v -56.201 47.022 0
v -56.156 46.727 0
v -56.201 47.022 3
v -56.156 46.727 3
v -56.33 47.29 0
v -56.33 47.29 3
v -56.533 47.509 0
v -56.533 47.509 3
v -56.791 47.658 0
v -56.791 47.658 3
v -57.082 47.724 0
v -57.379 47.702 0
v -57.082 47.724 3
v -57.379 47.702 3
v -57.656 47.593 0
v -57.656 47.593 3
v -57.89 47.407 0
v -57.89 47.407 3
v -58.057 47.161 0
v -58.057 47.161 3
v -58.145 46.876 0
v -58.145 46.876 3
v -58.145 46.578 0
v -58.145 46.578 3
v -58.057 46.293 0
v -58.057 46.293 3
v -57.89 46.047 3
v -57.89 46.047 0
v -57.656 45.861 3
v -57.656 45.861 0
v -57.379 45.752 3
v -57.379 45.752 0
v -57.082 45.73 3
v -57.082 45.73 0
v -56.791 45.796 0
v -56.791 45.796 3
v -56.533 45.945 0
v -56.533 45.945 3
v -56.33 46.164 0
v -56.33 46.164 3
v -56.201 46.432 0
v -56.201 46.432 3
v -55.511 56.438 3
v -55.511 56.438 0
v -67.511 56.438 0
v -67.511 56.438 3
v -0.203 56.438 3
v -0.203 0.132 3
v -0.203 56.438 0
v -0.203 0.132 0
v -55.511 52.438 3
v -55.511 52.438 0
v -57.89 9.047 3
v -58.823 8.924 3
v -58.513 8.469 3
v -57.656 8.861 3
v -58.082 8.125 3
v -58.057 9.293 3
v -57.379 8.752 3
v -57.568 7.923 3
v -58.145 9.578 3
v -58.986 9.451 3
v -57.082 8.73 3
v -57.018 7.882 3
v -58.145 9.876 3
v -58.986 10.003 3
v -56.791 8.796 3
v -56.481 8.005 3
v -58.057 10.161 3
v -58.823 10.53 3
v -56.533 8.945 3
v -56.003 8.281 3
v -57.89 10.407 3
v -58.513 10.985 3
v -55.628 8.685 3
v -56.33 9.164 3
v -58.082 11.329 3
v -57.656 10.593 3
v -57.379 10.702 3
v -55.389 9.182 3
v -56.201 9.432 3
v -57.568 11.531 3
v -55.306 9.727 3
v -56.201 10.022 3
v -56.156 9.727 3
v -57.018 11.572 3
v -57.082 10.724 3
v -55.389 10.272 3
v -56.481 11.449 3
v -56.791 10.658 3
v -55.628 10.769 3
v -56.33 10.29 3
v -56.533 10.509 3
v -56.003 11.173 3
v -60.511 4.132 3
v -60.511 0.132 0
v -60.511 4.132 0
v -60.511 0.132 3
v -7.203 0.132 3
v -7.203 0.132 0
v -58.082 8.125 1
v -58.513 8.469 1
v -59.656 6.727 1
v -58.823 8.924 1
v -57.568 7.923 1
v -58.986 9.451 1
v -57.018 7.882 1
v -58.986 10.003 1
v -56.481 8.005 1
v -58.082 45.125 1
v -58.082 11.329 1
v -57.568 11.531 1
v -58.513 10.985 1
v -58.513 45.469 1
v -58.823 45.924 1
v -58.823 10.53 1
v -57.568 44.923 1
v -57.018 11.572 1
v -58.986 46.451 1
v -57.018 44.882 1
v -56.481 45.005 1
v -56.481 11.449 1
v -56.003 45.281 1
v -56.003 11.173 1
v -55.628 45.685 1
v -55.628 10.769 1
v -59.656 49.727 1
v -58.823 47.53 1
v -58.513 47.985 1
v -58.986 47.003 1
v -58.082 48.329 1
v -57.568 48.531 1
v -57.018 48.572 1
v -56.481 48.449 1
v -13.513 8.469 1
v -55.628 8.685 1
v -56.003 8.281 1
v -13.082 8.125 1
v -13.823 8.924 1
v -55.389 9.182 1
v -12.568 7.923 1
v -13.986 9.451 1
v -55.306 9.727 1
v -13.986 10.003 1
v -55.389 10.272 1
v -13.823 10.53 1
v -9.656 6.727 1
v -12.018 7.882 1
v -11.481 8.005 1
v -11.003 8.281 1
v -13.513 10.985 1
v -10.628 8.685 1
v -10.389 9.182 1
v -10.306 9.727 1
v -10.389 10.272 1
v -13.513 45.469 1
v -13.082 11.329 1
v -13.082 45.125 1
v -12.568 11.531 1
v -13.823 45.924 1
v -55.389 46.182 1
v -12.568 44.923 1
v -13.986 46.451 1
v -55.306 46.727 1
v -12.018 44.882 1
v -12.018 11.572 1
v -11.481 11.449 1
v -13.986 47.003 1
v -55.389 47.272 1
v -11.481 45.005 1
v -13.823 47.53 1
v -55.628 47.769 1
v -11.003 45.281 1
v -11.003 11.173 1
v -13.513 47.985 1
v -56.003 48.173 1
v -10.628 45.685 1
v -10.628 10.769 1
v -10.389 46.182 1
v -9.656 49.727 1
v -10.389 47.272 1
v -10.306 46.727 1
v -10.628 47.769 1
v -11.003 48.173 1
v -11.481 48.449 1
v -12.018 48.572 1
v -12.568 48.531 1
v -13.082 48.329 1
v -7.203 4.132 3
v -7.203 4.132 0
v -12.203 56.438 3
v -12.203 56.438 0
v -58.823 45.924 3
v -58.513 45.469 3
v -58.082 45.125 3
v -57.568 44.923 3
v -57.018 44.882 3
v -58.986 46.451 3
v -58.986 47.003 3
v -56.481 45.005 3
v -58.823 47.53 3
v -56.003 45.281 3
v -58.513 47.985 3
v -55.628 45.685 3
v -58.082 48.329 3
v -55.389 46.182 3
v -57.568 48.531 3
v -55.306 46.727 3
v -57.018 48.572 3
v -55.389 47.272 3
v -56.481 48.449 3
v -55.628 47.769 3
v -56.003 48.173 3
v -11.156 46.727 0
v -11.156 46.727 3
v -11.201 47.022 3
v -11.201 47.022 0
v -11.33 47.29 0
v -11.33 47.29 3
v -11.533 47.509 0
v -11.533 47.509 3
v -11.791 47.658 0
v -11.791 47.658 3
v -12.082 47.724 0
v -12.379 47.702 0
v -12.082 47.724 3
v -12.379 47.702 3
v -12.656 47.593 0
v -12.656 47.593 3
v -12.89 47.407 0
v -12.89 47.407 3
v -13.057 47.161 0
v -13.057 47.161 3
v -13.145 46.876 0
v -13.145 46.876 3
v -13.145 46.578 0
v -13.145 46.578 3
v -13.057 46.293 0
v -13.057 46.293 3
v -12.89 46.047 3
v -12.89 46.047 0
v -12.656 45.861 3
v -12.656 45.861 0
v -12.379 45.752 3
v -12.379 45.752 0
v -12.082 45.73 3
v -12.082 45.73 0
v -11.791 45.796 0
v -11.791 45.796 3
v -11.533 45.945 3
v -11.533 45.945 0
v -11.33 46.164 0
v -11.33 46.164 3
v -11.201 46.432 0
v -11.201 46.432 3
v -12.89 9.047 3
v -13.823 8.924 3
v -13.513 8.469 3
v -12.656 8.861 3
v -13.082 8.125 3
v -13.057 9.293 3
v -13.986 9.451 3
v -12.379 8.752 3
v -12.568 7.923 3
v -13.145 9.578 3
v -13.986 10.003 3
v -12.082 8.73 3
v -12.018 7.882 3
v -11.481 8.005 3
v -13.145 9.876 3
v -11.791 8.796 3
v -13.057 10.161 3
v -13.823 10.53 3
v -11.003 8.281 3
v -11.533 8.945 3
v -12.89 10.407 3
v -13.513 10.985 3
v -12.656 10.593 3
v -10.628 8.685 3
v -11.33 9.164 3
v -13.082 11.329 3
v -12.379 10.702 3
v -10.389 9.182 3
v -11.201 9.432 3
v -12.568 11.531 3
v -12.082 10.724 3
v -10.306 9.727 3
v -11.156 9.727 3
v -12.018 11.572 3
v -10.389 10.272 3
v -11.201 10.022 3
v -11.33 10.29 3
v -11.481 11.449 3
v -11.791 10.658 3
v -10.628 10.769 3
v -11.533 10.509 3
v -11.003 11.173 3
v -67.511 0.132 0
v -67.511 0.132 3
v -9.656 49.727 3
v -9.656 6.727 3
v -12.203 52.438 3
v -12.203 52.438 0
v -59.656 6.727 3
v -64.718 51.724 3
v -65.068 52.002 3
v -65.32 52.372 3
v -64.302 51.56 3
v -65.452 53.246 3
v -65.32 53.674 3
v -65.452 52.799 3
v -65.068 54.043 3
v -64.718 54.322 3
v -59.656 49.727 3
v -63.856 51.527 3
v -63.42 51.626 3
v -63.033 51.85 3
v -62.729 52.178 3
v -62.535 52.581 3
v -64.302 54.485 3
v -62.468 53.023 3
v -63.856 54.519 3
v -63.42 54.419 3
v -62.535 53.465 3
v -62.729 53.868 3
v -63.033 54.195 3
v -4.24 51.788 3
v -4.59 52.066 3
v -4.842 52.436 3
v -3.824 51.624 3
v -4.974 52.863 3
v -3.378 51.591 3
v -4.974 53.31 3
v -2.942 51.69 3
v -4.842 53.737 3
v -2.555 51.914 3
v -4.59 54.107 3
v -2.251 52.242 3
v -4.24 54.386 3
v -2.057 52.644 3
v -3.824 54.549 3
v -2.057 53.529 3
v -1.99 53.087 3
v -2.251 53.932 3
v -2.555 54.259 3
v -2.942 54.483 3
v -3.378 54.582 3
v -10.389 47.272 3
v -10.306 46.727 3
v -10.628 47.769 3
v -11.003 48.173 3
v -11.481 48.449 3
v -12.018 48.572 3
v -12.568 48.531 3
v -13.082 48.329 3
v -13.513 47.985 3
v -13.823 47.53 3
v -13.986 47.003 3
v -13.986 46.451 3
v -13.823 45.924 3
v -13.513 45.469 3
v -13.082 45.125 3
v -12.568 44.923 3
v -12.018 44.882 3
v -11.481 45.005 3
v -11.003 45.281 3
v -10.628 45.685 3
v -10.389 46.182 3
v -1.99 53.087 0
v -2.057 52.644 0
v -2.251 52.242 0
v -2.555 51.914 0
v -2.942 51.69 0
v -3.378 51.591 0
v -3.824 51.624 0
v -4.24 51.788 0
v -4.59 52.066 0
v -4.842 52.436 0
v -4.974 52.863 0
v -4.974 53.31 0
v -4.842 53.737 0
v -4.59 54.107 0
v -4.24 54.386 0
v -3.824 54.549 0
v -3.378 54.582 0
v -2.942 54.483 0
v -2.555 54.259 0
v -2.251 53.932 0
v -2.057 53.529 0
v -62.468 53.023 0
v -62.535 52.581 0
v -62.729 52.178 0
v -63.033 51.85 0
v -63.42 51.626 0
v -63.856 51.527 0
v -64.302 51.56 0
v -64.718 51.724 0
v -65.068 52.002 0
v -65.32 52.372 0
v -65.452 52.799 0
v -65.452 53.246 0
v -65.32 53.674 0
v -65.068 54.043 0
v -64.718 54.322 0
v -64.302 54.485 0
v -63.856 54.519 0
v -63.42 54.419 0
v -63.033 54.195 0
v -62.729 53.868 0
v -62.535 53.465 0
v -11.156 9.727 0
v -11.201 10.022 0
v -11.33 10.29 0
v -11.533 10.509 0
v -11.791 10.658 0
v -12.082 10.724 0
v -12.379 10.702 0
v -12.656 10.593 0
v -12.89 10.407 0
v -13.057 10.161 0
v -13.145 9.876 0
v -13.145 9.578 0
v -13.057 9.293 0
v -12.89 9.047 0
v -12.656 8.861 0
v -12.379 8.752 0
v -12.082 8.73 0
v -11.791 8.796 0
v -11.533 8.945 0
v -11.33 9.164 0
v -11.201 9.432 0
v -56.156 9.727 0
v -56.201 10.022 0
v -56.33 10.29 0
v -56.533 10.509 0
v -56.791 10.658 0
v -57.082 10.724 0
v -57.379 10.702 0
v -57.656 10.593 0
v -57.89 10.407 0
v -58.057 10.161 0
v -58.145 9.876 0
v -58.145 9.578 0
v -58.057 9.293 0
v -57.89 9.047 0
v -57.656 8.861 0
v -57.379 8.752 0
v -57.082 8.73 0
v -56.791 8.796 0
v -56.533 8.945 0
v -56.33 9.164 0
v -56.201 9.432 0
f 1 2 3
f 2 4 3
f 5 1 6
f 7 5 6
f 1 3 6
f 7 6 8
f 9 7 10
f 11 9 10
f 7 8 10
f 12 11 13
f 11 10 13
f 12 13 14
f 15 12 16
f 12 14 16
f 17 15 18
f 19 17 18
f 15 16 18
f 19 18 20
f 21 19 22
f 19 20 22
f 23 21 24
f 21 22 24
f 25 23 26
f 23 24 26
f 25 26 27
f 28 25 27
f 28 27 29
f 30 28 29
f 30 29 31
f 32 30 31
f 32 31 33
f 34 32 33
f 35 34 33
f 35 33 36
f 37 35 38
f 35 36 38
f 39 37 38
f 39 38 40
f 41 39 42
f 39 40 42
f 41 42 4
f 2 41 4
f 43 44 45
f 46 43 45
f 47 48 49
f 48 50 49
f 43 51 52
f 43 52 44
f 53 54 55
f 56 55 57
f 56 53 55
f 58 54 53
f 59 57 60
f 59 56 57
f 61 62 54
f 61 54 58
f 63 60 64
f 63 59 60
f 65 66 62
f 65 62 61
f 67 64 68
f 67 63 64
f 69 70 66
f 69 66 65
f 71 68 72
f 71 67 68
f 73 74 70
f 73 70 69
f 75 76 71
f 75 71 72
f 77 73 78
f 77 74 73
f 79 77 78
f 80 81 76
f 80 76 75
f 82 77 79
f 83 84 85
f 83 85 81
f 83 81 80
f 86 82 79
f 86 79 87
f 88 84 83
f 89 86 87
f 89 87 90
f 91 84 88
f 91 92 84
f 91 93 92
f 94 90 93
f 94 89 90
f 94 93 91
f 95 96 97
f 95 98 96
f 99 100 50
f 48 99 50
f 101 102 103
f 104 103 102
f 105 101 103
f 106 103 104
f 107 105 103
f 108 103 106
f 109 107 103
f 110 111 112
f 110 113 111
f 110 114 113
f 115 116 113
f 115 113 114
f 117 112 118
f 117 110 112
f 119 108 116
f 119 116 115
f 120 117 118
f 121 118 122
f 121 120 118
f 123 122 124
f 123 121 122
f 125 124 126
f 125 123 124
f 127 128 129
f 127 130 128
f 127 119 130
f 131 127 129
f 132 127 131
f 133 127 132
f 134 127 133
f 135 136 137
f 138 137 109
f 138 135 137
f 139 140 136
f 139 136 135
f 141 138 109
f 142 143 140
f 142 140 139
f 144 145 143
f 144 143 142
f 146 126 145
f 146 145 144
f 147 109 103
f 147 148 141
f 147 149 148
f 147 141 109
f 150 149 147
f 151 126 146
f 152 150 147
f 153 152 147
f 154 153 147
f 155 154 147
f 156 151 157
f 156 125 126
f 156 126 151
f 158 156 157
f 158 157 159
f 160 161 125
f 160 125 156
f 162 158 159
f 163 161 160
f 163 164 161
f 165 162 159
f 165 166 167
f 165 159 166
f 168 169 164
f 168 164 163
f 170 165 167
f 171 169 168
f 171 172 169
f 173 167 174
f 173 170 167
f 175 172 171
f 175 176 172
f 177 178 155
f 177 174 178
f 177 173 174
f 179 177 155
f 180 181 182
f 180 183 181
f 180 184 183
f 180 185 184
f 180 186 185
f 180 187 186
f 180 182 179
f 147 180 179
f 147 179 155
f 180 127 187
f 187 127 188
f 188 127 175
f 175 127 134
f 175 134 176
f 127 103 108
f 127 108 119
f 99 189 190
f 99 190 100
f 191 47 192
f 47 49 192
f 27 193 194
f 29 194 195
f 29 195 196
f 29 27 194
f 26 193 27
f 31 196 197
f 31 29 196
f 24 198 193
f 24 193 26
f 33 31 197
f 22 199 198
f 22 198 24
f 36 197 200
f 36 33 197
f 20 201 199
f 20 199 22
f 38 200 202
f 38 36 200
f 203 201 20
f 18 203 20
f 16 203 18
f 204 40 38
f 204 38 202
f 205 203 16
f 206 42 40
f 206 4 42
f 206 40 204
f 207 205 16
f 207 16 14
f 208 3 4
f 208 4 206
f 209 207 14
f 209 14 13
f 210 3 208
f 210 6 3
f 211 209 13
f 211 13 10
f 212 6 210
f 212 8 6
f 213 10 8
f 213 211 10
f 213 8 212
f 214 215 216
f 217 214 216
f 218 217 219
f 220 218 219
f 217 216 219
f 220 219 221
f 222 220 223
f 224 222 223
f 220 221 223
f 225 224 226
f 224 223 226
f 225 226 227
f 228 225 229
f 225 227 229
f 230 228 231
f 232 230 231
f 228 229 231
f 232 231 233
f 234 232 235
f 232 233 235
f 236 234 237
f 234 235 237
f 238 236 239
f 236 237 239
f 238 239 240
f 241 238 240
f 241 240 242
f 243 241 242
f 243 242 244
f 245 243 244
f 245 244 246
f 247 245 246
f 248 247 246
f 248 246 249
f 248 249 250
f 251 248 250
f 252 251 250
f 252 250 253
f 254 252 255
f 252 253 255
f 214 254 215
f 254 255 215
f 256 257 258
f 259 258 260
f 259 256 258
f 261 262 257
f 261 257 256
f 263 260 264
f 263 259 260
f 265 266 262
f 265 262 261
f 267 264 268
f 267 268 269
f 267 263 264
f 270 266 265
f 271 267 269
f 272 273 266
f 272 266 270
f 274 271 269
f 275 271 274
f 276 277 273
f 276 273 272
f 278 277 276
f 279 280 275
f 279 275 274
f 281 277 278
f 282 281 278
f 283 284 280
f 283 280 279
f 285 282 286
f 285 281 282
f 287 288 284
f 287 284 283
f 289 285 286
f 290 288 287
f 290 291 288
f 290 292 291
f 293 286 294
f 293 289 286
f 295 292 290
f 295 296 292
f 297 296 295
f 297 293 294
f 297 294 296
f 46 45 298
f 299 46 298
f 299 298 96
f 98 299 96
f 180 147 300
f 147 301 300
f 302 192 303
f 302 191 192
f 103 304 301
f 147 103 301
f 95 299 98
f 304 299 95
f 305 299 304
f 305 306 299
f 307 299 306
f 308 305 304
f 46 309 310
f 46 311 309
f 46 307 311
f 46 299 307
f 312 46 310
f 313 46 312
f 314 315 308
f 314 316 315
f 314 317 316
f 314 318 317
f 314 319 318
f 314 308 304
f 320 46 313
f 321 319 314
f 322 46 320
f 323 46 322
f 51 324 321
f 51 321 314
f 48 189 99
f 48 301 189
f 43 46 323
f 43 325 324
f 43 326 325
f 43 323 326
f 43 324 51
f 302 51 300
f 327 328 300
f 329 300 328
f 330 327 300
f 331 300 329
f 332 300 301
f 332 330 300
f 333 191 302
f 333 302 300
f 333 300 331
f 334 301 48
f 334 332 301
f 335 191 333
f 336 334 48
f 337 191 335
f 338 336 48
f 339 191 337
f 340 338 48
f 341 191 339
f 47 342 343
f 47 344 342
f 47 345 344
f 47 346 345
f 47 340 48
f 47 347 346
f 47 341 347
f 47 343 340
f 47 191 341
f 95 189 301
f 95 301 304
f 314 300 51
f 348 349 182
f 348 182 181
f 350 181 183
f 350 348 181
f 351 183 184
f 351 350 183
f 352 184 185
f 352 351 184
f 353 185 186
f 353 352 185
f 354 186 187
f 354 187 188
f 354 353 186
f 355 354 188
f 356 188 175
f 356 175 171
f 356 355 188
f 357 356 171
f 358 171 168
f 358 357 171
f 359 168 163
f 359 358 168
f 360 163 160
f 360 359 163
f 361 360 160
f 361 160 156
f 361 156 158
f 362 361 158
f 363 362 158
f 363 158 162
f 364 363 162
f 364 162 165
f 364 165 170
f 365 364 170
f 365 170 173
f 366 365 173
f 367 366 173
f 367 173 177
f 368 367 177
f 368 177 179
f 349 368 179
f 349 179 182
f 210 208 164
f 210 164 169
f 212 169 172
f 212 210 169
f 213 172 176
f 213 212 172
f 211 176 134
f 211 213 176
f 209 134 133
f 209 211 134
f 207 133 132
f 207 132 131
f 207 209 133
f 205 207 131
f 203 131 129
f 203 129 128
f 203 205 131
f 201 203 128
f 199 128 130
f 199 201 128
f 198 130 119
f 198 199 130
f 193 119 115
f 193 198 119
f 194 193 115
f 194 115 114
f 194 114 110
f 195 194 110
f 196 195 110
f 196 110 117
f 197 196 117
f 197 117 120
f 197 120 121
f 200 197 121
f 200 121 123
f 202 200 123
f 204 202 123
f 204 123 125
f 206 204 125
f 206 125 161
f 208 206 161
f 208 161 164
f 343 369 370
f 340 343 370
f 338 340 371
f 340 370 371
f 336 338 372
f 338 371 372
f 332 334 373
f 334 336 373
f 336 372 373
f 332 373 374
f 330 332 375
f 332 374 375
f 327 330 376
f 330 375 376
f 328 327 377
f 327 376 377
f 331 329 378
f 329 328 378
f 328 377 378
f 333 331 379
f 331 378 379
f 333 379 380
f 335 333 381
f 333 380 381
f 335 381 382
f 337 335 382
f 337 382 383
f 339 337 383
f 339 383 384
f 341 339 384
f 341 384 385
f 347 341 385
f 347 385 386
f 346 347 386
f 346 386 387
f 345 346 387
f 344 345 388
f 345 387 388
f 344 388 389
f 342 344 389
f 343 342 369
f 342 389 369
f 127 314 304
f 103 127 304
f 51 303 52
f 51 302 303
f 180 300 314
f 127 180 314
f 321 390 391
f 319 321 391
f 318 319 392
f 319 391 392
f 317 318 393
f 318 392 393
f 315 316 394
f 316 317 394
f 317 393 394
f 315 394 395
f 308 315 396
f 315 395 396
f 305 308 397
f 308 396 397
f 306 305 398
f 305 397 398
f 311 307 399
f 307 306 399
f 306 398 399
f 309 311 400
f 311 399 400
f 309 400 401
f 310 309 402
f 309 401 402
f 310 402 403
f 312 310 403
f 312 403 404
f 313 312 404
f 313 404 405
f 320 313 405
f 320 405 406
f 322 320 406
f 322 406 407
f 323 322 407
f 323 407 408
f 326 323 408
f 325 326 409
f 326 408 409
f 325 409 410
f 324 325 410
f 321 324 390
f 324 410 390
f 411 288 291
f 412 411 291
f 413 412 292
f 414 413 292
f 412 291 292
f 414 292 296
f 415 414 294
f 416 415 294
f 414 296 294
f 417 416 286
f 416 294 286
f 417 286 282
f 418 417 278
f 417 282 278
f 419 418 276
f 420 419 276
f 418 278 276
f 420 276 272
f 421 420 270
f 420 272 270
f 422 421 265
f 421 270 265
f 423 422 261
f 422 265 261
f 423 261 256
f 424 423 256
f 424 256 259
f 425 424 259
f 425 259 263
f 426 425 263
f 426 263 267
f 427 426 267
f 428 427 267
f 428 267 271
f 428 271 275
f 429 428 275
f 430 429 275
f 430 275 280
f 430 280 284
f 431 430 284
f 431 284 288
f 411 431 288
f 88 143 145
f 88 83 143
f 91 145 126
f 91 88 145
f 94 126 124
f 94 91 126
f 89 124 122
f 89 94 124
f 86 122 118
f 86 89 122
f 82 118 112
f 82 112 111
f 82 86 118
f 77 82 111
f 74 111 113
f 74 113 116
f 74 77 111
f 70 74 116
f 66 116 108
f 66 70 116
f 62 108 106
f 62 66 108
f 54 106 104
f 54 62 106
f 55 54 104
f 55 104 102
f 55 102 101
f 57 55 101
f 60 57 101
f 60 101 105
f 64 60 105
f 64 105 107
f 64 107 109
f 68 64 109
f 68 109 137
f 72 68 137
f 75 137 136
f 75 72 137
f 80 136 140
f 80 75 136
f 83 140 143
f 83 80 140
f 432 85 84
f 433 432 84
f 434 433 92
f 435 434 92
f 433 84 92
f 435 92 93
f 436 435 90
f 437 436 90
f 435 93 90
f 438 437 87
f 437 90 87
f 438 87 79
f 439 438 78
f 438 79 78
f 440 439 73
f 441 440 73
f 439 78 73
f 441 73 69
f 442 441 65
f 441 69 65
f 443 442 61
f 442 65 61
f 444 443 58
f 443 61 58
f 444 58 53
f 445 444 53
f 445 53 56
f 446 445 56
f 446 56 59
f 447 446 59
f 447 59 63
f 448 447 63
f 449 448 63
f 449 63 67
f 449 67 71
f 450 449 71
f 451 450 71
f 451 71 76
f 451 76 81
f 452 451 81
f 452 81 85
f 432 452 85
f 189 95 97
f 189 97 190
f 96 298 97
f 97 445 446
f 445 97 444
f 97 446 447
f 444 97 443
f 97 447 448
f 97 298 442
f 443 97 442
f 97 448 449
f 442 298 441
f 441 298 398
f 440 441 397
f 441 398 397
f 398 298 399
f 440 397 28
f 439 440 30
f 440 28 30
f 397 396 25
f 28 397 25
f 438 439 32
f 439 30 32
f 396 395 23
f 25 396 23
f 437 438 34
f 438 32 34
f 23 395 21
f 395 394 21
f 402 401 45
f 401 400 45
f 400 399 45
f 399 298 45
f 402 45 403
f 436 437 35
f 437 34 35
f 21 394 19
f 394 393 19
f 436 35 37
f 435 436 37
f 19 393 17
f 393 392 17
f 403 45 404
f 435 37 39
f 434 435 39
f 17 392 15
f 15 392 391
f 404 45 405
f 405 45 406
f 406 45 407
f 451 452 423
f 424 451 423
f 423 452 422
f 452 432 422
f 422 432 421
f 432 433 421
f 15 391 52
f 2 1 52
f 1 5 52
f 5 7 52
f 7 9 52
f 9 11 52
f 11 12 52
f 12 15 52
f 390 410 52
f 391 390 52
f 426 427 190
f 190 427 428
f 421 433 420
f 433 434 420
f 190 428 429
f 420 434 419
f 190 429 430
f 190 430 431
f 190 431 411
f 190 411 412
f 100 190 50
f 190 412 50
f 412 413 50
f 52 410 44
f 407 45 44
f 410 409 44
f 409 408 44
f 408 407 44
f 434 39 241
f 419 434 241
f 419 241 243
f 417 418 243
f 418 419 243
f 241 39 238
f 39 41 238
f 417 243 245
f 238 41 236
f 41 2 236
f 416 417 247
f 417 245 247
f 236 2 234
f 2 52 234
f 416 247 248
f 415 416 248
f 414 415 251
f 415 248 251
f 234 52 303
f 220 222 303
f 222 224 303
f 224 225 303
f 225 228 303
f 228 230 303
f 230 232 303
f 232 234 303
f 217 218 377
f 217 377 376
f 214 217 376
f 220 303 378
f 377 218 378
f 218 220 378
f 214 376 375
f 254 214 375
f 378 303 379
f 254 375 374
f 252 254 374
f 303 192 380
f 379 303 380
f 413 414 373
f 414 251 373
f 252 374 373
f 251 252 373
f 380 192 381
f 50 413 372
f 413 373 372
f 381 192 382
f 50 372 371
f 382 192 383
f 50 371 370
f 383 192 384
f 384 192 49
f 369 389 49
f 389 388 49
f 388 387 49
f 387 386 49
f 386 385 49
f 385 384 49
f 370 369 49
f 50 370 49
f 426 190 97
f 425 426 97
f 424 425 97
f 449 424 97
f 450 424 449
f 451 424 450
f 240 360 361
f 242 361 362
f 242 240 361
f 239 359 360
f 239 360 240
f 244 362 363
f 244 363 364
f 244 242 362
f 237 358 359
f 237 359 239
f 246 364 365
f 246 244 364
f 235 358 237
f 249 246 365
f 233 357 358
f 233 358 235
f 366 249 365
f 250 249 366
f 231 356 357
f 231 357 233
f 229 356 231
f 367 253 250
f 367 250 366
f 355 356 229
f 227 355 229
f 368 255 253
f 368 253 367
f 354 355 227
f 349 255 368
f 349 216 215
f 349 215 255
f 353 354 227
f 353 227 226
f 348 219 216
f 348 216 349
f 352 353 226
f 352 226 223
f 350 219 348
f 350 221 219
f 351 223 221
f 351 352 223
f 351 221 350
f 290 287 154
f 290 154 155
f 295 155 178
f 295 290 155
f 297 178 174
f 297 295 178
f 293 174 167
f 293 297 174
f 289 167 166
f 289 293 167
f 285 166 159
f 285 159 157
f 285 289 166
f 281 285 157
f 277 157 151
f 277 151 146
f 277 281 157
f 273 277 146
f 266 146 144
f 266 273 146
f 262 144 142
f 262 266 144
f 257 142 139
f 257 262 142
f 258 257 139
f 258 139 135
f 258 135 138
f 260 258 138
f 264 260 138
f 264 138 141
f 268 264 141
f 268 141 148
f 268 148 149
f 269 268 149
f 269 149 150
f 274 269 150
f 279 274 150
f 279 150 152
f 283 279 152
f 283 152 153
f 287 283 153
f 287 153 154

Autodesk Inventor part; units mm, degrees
ref_plane "YZ Plane" through (0, 0, 0) normal (1, 0, 0) x (0, 1, 0)
ref_plane "XZ Plane" through (0, 0, 0) normal (0, 1, 0) x (-1, 0, 0)
ref_plane "XY Plane" through (0, 0, 0) normal (0, 0, 1) x (1, 0, 0)
ref_plane "Work Plane1" through (-62.4151, 1.9295, 0) normal (0, 0, 1) x (1, 0, 0)
sketch "Sketch1" plane through (-62.4151, 1.9295, 0) normal (0, 0, 1) x (1, 0, 0)
  line L0 (-5.0959, -1.798) -> (62.2123, -1.798)
  line L1 (62.2123, -1.798) -> (62.2123, 54.509)
  line L2 (62.2123, 54.509) -> (-5.0959, 54.509)
  line L3 (-5.0959, 54.509) -> (-5.0959, -1.798)
  circle A0 centre (-1.5532, 51.0932) radius 1.5
  circle A1 centre (58.9247, 51.1571) radius 1.5
  point P0 (62.4151, -1.9295)
  dimension "d1" = 3
  dimension "d6" = 3
extrude "Extrusion1" add sketch "Sketch1" along normal blind 3
sketch "Sketch3" plane through (-62.4151, 1.9295, 3) normal (0, 0, 1) x (1, 0, 0)
  line L0 (52.7586, 47.7976) -> (2.7586, 47.7976)
  line L1 (2.7586, 47.7976) -> (2.7586, 4.7976)
  line L2 (2.7586, 4.7976) -> (52.7586, 4.7976)
  line L3 (52.7586, 4.7976) -> (52.7586, 47.7976)
  circle A0 centre (5.2586, 7.7976) radius 1
  circle A1 centre (5.2586, 7.7976) radius 1.85
  circle A2 centre (50.2586, 7.7976) radius 1
  circle A3 centre (50.2586, 7.7976) radius 1.85
  circle A4 centre (50.2586, 44.7976) radius 1
  circle A5 centre (50.2586, 44.7976) radius 1.85
  circle A6 centre (5.2586, 44.7976) radius 1
  circle A7 centre (5.2586, 44.7976) radius 1.85
  point P0 (62.4151, -1.9295)
  dimension "d7" = 50
  dimension "d8" = 43
  dimension "d9" = 2
  dimension "d10" = 3.7
  dimension "d11" = 3
  dimension "d12" = 2.5
  dimension "d13" = 2
  dimension "d14" = 3.7
  dimension "d15" = 2
  dimension "d16" = 3.7
  dimension "d17" = 2
  dimension "d18" = 3.7
  dimension "d19" = 3
  dimension "d20" = 2.5
  dimension "d21" = 2.5
  dimension "d22" = 3
  dimension "d23" = 2.5
  dimension "d24" = 3
extrude "Extrusion3" cut sketch "Sketch3" against normal blind 2
sketch "Sketch4" plane through (-62.4151, 1.9295, 1) normal (0, 0, 1) x (1, 0, 0)
  circle A0 centre (50.2586, 7.7976) radius 1 projected
  circle A1 centre (50.2586, 7.7976) radius 1
  circle A2 centre (50.2586, 44.7976) radius 1 projected
  circle A3 centre (50.2586, 44.7976) radius 1
  circle A4 centre (5.2586, 44.7976) radius 1 projected
  circle A5 centre (5.2586, 44.7976) radius 1
  circle A6 centre (5.2586, 7.7976) radius 1 projected
  circle A7 centre (5.2586, 7.7976) radius 1
  point P0 (62.4151, -1.9295)
extrude "Extrusion4" cut sketch "Sketch4" against normal through all
sketch "Sketch5" plane through (-62.4151, 1.9295, 3) normal (0, 0, 1) x (1, 0, 0)
  line L0 (-5.0959, -1.798) -> (62.2123, -1.798) projected
  line L1 (55.2123, -1.798) -> (1.9041, -1.798)
  line L2 (1.9041, -1.798) -> (1.9041, 2.202)
  line L3 (1.9041, 2.202) -> (55.2123, 2.202)
  line L4 (55.2123, 2.202) -> (55.2123, -1.798)
  line L5 (62.2123, 54.509) -> (-5.0959, 54.509) projected
  line L6 (6.9041, 54.509) -> (50.2123, 54.509)
  line L7 (50.2123, 54.509) -> (50.2123, 50.509)
  line L8 (50.2123, 50.509) -> (6.9041, 50.509)
  line L9 (6.9041, 50.509) -> (6.9041, 54.509)
  line L10 (62.2123, -1.798) -> (62.2123, 54.509) projected
  line L11 (-5.0959, 54.509) -> (-5.0959, -1.798) projected
  point P0 (62.4151, -1.9295)
  point P1 (50.2123, 52.509)
  point P2 (6.9041, 52.509)
  point P3 (1.9041, 0.202)
  point P4 (55.2123, 0.202)
  dimension "d29" = 4
  dimension "d30" = 4
  dimension "d31" = 12
  dimension "d32" = 12
  dimension "d33" = 7
  dimension "d34" = 7
extrude "Extrusion5" cut sketch "Sketch5" against normal through all contours L2 L3 L4 L0 | L5 L7 L8 L9
properties part number "RelayTray"
